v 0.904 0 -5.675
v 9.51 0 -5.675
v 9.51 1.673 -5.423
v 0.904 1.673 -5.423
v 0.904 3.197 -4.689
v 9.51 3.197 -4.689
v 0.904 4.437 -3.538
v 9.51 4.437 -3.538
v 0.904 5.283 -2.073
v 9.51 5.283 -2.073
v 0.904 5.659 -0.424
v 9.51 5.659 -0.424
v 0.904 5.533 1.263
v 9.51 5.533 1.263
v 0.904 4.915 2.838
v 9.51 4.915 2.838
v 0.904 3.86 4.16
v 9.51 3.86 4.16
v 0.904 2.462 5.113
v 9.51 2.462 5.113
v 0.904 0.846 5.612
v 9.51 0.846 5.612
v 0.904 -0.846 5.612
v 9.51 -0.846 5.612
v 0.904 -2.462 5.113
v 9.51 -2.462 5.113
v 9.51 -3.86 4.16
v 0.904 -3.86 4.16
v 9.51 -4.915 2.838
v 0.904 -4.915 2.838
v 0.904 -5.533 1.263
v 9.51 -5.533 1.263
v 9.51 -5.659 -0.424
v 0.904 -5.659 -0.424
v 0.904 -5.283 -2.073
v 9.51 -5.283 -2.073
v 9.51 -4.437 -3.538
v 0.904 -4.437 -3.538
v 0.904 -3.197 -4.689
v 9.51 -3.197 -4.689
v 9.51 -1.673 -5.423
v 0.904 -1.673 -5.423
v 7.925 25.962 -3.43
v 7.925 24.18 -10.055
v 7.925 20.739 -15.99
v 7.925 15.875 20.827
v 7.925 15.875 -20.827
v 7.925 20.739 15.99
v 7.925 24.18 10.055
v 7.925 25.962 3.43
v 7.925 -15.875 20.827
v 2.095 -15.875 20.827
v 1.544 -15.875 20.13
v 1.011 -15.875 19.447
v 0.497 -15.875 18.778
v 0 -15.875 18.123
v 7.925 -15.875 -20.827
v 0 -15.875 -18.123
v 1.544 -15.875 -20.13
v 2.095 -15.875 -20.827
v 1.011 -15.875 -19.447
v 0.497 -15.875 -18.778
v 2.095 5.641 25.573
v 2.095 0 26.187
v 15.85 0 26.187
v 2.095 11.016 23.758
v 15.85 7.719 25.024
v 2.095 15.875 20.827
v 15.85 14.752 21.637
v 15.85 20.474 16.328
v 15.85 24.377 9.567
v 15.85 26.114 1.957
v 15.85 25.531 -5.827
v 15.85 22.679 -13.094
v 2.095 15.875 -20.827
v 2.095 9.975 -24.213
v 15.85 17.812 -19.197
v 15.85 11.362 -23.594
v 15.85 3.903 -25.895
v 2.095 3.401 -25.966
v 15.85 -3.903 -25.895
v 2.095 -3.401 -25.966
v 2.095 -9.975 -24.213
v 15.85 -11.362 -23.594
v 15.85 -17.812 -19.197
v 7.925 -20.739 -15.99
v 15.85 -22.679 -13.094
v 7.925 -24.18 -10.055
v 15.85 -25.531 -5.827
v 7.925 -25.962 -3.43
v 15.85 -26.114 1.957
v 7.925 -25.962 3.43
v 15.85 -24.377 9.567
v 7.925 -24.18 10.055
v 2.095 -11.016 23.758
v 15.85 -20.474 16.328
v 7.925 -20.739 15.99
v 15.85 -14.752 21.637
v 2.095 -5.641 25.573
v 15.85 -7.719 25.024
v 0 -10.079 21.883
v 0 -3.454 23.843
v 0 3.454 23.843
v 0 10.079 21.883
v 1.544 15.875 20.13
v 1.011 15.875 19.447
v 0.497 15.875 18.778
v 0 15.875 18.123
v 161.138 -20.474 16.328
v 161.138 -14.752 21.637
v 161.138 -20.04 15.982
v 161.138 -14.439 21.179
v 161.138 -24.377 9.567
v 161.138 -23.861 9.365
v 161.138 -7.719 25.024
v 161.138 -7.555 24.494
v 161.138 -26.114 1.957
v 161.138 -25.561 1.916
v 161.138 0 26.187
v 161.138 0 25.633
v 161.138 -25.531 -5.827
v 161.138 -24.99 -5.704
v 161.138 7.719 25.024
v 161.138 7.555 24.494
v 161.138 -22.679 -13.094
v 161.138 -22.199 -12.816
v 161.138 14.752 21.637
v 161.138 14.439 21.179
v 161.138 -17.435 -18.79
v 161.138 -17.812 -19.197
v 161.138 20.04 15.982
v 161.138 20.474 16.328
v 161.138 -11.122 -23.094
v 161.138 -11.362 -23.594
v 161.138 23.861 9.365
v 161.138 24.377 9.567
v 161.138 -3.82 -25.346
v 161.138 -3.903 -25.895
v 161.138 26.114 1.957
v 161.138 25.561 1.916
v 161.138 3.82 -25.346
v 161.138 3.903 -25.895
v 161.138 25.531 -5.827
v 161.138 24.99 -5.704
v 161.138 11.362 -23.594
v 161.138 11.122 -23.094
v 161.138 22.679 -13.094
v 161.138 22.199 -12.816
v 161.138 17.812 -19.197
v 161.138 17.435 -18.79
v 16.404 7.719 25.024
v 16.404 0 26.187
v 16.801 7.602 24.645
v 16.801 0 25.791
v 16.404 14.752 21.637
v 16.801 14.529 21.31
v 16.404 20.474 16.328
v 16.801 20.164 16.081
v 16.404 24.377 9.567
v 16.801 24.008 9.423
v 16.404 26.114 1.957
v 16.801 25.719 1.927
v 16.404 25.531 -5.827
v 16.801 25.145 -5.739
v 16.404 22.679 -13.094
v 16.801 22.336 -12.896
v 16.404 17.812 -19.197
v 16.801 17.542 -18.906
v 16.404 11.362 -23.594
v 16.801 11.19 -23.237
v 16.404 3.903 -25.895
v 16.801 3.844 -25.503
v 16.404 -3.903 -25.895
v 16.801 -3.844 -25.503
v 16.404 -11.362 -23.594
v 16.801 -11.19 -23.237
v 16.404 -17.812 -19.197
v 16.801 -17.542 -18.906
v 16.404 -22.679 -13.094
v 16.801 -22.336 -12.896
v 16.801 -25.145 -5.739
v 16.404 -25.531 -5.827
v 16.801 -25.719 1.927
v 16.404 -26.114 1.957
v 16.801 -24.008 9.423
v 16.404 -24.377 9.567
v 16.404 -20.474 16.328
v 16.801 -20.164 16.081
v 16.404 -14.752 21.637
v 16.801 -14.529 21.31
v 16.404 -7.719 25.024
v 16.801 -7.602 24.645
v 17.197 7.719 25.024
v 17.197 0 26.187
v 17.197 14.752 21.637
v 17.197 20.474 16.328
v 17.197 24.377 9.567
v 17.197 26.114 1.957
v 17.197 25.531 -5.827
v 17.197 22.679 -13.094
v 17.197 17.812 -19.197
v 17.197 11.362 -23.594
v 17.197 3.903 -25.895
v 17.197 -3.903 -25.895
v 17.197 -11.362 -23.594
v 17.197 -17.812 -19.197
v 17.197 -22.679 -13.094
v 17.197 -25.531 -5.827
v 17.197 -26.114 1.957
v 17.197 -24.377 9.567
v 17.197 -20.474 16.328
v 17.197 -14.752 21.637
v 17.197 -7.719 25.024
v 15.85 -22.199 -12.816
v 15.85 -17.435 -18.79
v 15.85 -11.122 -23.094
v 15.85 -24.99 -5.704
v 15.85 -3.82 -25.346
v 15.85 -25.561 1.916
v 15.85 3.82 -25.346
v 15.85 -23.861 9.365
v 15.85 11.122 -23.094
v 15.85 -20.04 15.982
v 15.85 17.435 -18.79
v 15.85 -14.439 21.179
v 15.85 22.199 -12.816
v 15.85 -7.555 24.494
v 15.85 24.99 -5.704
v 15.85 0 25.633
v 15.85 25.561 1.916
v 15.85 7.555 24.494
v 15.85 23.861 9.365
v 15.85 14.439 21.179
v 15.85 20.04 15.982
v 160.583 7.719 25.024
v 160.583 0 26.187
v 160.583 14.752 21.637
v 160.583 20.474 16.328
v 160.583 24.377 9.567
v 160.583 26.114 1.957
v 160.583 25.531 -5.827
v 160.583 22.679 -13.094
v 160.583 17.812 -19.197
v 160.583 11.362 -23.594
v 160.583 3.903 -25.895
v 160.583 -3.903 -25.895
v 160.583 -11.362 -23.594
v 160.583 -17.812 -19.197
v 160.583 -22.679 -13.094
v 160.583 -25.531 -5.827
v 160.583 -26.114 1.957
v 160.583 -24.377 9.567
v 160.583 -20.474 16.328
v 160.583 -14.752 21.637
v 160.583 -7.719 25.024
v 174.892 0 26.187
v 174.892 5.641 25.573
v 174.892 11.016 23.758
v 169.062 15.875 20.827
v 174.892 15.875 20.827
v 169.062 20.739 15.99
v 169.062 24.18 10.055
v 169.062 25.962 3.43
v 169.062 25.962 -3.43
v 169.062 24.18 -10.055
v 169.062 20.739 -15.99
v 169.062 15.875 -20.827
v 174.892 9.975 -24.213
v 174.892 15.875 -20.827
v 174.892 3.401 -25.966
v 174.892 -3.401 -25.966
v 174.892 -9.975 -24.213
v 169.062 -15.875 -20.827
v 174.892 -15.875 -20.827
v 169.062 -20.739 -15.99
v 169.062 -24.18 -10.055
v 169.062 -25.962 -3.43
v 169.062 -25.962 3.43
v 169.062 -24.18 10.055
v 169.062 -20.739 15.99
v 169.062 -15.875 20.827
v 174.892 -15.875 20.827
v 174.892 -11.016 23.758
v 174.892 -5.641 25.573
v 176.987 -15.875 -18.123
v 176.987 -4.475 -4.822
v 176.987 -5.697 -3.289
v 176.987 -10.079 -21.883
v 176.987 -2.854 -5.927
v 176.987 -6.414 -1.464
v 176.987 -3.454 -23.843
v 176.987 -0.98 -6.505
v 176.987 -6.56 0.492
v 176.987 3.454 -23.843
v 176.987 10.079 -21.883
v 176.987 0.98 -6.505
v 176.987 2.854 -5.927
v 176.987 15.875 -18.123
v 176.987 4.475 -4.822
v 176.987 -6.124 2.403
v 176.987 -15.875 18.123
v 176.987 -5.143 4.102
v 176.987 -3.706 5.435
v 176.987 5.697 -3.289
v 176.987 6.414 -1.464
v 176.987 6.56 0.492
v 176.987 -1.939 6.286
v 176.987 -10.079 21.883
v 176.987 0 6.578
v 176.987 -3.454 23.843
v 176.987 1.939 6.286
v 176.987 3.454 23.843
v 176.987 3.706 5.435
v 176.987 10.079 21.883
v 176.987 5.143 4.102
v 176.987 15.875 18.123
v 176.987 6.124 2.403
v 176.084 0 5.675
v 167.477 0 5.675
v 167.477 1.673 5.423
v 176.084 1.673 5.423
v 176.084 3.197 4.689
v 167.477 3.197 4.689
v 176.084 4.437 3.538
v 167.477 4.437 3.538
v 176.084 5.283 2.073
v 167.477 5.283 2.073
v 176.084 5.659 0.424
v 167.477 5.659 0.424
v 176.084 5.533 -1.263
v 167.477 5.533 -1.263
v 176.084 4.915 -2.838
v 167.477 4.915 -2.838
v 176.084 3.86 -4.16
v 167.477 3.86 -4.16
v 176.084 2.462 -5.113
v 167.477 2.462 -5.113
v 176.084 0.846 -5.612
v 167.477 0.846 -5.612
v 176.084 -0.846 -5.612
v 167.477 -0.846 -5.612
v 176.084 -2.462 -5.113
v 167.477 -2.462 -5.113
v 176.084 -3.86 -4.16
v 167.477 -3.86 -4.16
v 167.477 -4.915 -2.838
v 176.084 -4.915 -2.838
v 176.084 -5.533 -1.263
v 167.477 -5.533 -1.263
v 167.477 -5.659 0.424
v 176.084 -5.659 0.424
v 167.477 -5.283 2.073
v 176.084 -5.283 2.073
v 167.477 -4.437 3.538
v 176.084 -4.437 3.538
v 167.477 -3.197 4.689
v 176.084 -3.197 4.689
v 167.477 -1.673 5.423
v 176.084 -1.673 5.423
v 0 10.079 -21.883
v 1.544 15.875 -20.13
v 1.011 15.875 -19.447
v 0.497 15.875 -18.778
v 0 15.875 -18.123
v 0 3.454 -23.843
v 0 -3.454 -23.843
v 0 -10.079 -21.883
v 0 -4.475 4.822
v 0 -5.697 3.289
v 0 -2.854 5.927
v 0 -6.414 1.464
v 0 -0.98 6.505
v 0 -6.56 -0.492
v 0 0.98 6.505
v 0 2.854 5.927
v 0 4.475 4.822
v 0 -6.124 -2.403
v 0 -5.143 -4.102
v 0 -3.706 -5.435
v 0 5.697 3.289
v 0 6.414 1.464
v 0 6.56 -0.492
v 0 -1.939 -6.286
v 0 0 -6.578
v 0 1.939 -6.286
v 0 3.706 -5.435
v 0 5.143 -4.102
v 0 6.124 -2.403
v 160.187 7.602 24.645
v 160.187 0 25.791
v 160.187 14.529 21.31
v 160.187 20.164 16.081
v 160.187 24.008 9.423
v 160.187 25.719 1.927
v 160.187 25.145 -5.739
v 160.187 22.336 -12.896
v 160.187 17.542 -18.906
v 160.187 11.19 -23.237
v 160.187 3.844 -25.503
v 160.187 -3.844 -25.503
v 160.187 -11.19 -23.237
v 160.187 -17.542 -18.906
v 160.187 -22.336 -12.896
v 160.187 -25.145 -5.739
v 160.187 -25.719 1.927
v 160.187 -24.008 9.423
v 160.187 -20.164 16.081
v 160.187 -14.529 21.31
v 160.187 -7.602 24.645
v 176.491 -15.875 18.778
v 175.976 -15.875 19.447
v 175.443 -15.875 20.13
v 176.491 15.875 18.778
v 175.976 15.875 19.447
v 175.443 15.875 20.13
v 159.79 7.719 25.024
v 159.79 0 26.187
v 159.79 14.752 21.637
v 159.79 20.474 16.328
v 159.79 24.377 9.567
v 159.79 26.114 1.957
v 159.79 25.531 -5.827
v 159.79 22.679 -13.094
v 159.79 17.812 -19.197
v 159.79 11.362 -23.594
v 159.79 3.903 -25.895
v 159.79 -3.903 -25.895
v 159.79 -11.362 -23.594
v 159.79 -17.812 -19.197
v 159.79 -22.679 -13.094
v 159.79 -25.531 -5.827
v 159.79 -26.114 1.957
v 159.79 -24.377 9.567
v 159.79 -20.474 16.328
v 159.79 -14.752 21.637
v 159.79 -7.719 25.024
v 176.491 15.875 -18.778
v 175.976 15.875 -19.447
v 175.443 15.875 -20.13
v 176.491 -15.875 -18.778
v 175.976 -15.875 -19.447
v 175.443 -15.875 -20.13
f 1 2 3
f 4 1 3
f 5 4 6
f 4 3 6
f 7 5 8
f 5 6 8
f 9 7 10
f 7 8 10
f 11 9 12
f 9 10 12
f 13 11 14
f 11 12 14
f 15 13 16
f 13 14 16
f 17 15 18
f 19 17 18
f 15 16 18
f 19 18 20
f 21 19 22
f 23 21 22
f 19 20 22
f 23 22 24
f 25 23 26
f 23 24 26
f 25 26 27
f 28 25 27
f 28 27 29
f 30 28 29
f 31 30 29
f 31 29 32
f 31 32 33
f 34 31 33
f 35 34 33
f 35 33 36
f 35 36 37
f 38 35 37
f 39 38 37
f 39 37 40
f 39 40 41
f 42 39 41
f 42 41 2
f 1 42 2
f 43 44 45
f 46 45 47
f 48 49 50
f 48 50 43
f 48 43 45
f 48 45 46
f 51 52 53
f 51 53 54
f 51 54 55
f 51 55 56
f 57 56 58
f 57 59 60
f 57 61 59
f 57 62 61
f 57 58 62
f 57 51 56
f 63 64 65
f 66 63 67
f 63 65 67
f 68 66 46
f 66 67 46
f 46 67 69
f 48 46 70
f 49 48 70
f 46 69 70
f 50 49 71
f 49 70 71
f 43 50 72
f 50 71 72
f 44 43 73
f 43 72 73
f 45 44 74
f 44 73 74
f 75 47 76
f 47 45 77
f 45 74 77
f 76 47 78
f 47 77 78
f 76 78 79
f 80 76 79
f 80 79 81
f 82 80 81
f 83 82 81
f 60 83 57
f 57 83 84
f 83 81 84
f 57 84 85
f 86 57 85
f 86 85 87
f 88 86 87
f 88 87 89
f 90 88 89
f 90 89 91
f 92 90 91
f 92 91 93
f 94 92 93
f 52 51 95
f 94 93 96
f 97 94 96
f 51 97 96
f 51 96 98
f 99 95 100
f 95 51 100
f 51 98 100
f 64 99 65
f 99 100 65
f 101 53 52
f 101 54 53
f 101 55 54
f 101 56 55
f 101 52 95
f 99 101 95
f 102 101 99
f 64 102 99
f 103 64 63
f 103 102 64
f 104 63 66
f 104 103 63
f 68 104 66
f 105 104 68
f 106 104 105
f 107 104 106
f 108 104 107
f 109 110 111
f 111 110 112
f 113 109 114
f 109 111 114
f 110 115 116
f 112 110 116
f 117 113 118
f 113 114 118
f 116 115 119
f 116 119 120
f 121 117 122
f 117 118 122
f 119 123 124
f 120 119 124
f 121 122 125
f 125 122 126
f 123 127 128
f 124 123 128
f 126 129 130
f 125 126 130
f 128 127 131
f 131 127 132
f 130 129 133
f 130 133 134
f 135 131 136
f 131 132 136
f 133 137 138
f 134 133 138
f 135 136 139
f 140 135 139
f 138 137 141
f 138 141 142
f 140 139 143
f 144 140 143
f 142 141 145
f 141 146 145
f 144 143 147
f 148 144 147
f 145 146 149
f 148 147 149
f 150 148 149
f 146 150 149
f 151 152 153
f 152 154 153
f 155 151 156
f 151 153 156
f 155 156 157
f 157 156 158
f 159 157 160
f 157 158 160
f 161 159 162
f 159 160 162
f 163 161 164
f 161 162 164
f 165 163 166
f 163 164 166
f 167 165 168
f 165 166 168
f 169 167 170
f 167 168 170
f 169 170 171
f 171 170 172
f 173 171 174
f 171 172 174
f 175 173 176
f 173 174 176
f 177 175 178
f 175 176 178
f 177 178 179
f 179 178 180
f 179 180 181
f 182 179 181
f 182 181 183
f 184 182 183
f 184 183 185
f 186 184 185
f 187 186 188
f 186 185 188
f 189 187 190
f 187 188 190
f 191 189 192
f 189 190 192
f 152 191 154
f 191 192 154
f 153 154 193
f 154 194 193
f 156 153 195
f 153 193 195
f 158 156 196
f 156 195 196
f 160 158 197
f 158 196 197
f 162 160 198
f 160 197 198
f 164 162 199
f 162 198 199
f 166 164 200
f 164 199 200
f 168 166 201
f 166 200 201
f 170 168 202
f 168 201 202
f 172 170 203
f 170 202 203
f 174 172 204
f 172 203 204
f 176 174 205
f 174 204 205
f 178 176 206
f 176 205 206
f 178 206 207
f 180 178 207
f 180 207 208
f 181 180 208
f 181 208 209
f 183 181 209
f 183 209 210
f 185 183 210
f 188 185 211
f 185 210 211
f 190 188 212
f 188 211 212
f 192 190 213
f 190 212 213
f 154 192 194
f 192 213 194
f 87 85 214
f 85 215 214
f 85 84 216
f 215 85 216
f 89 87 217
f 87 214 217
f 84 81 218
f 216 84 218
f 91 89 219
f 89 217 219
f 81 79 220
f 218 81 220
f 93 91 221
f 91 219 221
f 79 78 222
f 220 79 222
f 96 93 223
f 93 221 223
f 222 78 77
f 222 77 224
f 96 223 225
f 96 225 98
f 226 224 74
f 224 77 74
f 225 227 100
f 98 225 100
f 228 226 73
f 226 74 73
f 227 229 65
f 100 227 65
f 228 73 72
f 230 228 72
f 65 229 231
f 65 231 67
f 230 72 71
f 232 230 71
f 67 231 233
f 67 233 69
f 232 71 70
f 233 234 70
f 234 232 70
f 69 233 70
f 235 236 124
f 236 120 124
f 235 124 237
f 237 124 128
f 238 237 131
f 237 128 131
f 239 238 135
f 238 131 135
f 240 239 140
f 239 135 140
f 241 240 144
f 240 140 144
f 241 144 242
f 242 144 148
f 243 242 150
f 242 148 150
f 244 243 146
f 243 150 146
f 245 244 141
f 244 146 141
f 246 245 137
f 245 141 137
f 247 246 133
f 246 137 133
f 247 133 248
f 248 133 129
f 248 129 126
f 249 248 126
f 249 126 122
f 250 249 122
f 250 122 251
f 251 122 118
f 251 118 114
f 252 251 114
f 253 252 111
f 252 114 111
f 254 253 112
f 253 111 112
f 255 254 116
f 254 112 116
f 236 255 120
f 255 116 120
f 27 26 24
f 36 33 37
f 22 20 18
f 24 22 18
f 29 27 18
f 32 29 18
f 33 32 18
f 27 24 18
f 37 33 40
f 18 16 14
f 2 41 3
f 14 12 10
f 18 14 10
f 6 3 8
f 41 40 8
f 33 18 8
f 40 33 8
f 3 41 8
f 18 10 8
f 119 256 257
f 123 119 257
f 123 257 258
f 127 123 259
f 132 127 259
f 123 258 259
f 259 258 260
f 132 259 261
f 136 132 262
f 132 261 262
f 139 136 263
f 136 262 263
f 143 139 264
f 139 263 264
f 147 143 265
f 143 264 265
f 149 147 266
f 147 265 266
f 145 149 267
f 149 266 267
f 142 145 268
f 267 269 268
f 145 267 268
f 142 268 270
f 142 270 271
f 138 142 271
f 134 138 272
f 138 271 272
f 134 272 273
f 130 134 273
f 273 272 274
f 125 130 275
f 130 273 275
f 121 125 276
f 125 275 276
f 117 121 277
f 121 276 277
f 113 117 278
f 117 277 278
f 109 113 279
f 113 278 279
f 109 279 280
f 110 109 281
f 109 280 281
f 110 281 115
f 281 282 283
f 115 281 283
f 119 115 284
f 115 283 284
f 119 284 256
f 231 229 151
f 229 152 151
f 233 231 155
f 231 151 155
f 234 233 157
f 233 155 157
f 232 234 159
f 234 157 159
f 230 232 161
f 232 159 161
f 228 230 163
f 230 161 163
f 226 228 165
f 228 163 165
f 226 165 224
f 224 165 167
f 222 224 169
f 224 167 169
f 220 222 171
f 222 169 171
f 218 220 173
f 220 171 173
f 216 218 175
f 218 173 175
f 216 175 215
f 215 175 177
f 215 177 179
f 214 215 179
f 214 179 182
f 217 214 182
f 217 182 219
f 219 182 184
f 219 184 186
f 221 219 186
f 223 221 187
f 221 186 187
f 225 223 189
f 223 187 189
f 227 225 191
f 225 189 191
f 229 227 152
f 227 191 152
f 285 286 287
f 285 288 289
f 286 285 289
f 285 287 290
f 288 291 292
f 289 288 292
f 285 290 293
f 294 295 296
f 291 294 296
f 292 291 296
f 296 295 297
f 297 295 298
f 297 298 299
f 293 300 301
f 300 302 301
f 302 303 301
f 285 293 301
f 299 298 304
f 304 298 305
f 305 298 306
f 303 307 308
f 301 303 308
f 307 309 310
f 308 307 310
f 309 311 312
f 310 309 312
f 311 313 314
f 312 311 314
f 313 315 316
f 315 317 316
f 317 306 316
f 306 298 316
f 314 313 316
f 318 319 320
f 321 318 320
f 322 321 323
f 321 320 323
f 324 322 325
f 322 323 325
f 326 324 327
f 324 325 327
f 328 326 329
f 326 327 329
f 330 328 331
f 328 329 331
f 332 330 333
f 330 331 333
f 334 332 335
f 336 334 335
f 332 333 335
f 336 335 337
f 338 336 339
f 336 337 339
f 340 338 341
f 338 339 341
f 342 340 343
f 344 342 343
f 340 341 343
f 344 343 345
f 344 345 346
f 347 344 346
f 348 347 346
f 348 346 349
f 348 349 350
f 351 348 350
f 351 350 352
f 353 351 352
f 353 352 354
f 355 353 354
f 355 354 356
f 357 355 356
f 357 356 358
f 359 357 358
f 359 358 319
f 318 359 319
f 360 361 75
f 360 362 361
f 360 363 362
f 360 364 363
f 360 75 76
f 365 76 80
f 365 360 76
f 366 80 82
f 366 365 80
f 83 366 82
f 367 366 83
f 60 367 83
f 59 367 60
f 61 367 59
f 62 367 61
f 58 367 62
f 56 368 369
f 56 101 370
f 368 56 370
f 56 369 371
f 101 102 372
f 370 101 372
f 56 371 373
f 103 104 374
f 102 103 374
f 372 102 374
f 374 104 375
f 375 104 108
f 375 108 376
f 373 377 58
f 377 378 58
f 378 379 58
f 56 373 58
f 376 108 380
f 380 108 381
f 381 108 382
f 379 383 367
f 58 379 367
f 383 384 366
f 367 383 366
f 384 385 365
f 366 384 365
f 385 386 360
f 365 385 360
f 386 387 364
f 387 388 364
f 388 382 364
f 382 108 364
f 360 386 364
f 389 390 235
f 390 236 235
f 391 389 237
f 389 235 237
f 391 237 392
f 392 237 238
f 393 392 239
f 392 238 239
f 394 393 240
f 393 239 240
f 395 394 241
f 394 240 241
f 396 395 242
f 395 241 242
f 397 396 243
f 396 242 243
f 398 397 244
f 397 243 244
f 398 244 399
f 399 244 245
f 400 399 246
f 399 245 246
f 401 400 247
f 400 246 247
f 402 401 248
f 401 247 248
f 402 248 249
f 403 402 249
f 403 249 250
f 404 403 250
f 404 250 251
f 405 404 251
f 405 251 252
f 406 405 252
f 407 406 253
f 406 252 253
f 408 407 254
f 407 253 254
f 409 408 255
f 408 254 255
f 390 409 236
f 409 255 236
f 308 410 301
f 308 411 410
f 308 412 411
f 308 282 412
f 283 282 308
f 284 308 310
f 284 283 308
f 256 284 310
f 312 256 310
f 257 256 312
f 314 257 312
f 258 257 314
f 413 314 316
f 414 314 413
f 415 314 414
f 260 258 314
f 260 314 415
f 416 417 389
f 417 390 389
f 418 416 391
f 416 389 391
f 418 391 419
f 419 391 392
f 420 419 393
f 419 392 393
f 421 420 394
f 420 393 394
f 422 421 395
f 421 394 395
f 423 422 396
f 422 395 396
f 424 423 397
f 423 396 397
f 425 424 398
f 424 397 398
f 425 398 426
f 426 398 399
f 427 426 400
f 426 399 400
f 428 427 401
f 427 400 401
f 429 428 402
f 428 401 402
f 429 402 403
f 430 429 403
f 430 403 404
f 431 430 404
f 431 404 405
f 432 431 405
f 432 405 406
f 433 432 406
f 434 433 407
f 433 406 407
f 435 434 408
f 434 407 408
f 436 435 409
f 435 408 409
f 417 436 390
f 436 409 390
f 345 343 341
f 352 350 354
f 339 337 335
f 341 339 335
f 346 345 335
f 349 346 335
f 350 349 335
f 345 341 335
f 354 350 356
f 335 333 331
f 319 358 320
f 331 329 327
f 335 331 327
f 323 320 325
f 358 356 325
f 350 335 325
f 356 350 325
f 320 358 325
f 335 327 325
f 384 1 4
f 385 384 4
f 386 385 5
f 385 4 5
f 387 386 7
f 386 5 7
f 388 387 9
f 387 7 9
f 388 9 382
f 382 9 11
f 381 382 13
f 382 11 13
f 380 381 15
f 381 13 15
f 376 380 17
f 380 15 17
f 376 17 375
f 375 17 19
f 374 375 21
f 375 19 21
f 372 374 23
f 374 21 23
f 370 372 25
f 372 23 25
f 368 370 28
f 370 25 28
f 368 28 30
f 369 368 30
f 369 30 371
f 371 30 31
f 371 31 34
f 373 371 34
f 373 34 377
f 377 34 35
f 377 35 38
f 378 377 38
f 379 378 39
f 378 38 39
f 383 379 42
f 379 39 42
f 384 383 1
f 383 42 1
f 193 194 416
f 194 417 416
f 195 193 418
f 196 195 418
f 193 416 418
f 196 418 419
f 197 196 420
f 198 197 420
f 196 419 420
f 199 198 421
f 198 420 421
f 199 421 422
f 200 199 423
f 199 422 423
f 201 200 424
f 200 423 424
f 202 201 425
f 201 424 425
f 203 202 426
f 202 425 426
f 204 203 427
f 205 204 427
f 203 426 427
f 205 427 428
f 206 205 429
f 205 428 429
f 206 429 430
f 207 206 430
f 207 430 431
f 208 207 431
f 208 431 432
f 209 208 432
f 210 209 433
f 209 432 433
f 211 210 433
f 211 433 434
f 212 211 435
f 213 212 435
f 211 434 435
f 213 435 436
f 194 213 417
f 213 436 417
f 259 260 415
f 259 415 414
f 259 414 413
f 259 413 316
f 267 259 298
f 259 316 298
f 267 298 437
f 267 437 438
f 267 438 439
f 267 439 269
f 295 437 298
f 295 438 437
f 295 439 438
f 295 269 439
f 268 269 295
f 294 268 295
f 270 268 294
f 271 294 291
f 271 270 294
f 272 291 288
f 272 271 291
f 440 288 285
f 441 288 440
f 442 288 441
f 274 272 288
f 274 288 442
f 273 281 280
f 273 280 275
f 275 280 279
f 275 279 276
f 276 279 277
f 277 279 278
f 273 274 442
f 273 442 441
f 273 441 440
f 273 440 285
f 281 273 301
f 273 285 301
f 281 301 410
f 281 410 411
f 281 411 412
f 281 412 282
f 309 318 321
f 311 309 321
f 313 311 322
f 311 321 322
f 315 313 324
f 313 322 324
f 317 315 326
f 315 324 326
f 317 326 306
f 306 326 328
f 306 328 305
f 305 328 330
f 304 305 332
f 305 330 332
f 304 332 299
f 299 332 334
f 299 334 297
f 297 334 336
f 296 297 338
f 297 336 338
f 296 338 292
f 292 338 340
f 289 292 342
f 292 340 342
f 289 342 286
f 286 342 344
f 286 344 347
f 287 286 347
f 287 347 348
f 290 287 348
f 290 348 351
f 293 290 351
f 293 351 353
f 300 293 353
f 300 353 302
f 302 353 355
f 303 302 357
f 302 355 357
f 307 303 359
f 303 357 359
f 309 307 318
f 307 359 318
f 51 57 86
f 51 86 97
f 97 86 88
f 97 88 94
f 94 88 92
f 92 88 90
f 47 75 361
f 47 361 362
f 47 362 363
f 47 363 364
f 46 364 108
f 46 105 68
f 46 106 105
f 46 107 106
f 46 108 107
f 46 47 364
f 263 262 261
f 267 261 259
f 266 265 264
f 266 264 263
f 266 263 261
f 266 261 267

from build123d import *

# Parameters (mm, degrees)
CUT_EXTRUDE1_START        = -7.9248
CUT_EXTRUDE1_DEPTH        = 7.9248
CUT_EXTRUDE2_START        = -7.9248
CUT_EXTRUDE2_DEPTH        = 7.9248
CUT_EXTRUDE3_DEPTH        = 7.9248
CUT_EXTRUDE4_DEPTH        = 7.9248
M10_CLEARANCE_HOLE1_D     = 11.35
M10_CLEARANCE_HOLE1_DEPTH = 9.50976
M10_CLEARANCE_HOLE2_D     = 11.35
M10_CLEARANCE_HOLE2_DEPTH = 9.50976
CHAMFER1_SIZE             = 2.094992
CHAMFER2_SIZE             = 0.9035


with BuildPart() as part:
    # Sketch1 → Revolve1 (revolve)
    with BuildSketch(Plane(origin=(0, 0, 0), x_dir=(-1, 0, 0), z_dir=(0, 0, -1)), mode=Mode.PRIVATE) as revolve1_sk:
        Polygon((-176.9872, 26.1874), (-176.9872, 0), (0, 0), (0, 26.1874), (-15.8496, 26.1874), (-15.8496, 25.632664), (-16.404336, 26.1874), (-16.800576, 25.79116), (-17.196816, 26.1874), (-159.790384, 26.1874), (-160.186624, 25.79116), (-160.582864, 26.1874), (-161.1376, 25.632664), (-161.1376, 26.1874), align=None)
    revolve(revolve1_sk.sketch.rotate(Axis((176.9872, 0, 0), (-1, 0, 0)), 270), axis=Axis((176.9872, 0, 0), (-1, 0, 0)))

    # Sketch2 → Cut-Extrude1 (cut)
    with BuildSketch(Plane.ZY.offset(CUT_EXTRUDE1_START)):
        with BuildLine():
            Line((-20.827008757, 15.875), (20.827008757, 15.875))
            ThreePointArc((20.827008757, 15.875), (0, 26.1874), (-20.827008757, 15.875))
        make_face()
    extrude(amount=CUT_EXTRUDE1_DEPTH, mode=Mode.SUBTRACT)

    # Sketch3 → Cut-Extrude2 (cut)
    with BuildSketch(Plane.ZY.offset(CUT_EXTRUDE2_START)):
        with BuildLine():
            Line((20.827008757, -15.875), (-20.827008757, -15.875))
            ThreePointArc((-20.827008757, -15.875), (0, -26.1874), (20.827008757, -15.875))
        make_face()
    extrude(amount=CUT_EXTRUDE2_DEPTH, mode=Mode.SUBTRACT)

    # Sketch4 → Cut-Extrude3 (cut)
    with BuildSketch(Plane(origin=(176.9872, 0, 0), x_dir=(0, 0, -1), z_dir=(1, 0, 0))):
        with BuildLine():
            Line((-20.827008757, 15.875), (20.827008757, 15.875))
            ThreePointArc((20.827008757, 15.875), (0, 26.1874), (-20.827008757, 15.875))
        make_face()
    extrude(amount=-CUT_EXTRUDE3_DEPTH, mode=Mode.SUBTRACT)

    # Sketch5 → Cut-Extrude4 (cut)
    with BuildSketch(Plane(origin=(176.9872, 0, 0), x_dir=(0, 0, -1), z_dir=(1, 0, 0))):
        with BuildLine():
            Line((20.827008757, -15.875), (-20.827008757, -15.875))
            ThreePointArc((-20.827008757, -15.875), (0, -26.1874), (20.827008757, -15.875))
        make_face()
    extrude(amount=-CUT_EXTRUDE4_DEPTH, mode=Mode.SUBTRACT)

    # M10 Clearance Hole1
    with Locations(Plane(origin=(176.9872, 0, 0), x_dir=(0, 0, -1), z_dir=(1, 0, 0))):
        with Locations((0, 0)):
            Hole(M10_CLEARANCE_HOLE1_D / 2, depth=M10_CLEARANCE_HOLE1_DEPTH)

    # M10 Clearance Hole2
    with Locations(Plane.ZY):
        with Locations((0, 0)):
            Hole(M10_CLEARANCE_HOLE2_D / 2, depth=M10_CLEARANCE_HOLE2_DEPTH)

    # Chamfer1
    chamfer1_edges = [part.edges().sort_by_distance(p)[0] for p in [
        (0, 0, -26.1874),
        (0, 8.377789375, 24.811137901),
        (176.9872, 0, -26.1874),
        (176.9872, 8.377789375, 24.811137901),
    ]]
    chamfer(chamfer1_edges, length=CHAMFER1_SIZE)

    # Chamfer2
    chamfer2_edges = [part.edges().sort_by_distance(p)[0] for p in [
        (176.9872, 0, -5.675),
        (0, 0, 5.675),
    ]]
    chamfer(chamfer2_edges, length=CHAMFER2_SIZE)


solid = part.part
